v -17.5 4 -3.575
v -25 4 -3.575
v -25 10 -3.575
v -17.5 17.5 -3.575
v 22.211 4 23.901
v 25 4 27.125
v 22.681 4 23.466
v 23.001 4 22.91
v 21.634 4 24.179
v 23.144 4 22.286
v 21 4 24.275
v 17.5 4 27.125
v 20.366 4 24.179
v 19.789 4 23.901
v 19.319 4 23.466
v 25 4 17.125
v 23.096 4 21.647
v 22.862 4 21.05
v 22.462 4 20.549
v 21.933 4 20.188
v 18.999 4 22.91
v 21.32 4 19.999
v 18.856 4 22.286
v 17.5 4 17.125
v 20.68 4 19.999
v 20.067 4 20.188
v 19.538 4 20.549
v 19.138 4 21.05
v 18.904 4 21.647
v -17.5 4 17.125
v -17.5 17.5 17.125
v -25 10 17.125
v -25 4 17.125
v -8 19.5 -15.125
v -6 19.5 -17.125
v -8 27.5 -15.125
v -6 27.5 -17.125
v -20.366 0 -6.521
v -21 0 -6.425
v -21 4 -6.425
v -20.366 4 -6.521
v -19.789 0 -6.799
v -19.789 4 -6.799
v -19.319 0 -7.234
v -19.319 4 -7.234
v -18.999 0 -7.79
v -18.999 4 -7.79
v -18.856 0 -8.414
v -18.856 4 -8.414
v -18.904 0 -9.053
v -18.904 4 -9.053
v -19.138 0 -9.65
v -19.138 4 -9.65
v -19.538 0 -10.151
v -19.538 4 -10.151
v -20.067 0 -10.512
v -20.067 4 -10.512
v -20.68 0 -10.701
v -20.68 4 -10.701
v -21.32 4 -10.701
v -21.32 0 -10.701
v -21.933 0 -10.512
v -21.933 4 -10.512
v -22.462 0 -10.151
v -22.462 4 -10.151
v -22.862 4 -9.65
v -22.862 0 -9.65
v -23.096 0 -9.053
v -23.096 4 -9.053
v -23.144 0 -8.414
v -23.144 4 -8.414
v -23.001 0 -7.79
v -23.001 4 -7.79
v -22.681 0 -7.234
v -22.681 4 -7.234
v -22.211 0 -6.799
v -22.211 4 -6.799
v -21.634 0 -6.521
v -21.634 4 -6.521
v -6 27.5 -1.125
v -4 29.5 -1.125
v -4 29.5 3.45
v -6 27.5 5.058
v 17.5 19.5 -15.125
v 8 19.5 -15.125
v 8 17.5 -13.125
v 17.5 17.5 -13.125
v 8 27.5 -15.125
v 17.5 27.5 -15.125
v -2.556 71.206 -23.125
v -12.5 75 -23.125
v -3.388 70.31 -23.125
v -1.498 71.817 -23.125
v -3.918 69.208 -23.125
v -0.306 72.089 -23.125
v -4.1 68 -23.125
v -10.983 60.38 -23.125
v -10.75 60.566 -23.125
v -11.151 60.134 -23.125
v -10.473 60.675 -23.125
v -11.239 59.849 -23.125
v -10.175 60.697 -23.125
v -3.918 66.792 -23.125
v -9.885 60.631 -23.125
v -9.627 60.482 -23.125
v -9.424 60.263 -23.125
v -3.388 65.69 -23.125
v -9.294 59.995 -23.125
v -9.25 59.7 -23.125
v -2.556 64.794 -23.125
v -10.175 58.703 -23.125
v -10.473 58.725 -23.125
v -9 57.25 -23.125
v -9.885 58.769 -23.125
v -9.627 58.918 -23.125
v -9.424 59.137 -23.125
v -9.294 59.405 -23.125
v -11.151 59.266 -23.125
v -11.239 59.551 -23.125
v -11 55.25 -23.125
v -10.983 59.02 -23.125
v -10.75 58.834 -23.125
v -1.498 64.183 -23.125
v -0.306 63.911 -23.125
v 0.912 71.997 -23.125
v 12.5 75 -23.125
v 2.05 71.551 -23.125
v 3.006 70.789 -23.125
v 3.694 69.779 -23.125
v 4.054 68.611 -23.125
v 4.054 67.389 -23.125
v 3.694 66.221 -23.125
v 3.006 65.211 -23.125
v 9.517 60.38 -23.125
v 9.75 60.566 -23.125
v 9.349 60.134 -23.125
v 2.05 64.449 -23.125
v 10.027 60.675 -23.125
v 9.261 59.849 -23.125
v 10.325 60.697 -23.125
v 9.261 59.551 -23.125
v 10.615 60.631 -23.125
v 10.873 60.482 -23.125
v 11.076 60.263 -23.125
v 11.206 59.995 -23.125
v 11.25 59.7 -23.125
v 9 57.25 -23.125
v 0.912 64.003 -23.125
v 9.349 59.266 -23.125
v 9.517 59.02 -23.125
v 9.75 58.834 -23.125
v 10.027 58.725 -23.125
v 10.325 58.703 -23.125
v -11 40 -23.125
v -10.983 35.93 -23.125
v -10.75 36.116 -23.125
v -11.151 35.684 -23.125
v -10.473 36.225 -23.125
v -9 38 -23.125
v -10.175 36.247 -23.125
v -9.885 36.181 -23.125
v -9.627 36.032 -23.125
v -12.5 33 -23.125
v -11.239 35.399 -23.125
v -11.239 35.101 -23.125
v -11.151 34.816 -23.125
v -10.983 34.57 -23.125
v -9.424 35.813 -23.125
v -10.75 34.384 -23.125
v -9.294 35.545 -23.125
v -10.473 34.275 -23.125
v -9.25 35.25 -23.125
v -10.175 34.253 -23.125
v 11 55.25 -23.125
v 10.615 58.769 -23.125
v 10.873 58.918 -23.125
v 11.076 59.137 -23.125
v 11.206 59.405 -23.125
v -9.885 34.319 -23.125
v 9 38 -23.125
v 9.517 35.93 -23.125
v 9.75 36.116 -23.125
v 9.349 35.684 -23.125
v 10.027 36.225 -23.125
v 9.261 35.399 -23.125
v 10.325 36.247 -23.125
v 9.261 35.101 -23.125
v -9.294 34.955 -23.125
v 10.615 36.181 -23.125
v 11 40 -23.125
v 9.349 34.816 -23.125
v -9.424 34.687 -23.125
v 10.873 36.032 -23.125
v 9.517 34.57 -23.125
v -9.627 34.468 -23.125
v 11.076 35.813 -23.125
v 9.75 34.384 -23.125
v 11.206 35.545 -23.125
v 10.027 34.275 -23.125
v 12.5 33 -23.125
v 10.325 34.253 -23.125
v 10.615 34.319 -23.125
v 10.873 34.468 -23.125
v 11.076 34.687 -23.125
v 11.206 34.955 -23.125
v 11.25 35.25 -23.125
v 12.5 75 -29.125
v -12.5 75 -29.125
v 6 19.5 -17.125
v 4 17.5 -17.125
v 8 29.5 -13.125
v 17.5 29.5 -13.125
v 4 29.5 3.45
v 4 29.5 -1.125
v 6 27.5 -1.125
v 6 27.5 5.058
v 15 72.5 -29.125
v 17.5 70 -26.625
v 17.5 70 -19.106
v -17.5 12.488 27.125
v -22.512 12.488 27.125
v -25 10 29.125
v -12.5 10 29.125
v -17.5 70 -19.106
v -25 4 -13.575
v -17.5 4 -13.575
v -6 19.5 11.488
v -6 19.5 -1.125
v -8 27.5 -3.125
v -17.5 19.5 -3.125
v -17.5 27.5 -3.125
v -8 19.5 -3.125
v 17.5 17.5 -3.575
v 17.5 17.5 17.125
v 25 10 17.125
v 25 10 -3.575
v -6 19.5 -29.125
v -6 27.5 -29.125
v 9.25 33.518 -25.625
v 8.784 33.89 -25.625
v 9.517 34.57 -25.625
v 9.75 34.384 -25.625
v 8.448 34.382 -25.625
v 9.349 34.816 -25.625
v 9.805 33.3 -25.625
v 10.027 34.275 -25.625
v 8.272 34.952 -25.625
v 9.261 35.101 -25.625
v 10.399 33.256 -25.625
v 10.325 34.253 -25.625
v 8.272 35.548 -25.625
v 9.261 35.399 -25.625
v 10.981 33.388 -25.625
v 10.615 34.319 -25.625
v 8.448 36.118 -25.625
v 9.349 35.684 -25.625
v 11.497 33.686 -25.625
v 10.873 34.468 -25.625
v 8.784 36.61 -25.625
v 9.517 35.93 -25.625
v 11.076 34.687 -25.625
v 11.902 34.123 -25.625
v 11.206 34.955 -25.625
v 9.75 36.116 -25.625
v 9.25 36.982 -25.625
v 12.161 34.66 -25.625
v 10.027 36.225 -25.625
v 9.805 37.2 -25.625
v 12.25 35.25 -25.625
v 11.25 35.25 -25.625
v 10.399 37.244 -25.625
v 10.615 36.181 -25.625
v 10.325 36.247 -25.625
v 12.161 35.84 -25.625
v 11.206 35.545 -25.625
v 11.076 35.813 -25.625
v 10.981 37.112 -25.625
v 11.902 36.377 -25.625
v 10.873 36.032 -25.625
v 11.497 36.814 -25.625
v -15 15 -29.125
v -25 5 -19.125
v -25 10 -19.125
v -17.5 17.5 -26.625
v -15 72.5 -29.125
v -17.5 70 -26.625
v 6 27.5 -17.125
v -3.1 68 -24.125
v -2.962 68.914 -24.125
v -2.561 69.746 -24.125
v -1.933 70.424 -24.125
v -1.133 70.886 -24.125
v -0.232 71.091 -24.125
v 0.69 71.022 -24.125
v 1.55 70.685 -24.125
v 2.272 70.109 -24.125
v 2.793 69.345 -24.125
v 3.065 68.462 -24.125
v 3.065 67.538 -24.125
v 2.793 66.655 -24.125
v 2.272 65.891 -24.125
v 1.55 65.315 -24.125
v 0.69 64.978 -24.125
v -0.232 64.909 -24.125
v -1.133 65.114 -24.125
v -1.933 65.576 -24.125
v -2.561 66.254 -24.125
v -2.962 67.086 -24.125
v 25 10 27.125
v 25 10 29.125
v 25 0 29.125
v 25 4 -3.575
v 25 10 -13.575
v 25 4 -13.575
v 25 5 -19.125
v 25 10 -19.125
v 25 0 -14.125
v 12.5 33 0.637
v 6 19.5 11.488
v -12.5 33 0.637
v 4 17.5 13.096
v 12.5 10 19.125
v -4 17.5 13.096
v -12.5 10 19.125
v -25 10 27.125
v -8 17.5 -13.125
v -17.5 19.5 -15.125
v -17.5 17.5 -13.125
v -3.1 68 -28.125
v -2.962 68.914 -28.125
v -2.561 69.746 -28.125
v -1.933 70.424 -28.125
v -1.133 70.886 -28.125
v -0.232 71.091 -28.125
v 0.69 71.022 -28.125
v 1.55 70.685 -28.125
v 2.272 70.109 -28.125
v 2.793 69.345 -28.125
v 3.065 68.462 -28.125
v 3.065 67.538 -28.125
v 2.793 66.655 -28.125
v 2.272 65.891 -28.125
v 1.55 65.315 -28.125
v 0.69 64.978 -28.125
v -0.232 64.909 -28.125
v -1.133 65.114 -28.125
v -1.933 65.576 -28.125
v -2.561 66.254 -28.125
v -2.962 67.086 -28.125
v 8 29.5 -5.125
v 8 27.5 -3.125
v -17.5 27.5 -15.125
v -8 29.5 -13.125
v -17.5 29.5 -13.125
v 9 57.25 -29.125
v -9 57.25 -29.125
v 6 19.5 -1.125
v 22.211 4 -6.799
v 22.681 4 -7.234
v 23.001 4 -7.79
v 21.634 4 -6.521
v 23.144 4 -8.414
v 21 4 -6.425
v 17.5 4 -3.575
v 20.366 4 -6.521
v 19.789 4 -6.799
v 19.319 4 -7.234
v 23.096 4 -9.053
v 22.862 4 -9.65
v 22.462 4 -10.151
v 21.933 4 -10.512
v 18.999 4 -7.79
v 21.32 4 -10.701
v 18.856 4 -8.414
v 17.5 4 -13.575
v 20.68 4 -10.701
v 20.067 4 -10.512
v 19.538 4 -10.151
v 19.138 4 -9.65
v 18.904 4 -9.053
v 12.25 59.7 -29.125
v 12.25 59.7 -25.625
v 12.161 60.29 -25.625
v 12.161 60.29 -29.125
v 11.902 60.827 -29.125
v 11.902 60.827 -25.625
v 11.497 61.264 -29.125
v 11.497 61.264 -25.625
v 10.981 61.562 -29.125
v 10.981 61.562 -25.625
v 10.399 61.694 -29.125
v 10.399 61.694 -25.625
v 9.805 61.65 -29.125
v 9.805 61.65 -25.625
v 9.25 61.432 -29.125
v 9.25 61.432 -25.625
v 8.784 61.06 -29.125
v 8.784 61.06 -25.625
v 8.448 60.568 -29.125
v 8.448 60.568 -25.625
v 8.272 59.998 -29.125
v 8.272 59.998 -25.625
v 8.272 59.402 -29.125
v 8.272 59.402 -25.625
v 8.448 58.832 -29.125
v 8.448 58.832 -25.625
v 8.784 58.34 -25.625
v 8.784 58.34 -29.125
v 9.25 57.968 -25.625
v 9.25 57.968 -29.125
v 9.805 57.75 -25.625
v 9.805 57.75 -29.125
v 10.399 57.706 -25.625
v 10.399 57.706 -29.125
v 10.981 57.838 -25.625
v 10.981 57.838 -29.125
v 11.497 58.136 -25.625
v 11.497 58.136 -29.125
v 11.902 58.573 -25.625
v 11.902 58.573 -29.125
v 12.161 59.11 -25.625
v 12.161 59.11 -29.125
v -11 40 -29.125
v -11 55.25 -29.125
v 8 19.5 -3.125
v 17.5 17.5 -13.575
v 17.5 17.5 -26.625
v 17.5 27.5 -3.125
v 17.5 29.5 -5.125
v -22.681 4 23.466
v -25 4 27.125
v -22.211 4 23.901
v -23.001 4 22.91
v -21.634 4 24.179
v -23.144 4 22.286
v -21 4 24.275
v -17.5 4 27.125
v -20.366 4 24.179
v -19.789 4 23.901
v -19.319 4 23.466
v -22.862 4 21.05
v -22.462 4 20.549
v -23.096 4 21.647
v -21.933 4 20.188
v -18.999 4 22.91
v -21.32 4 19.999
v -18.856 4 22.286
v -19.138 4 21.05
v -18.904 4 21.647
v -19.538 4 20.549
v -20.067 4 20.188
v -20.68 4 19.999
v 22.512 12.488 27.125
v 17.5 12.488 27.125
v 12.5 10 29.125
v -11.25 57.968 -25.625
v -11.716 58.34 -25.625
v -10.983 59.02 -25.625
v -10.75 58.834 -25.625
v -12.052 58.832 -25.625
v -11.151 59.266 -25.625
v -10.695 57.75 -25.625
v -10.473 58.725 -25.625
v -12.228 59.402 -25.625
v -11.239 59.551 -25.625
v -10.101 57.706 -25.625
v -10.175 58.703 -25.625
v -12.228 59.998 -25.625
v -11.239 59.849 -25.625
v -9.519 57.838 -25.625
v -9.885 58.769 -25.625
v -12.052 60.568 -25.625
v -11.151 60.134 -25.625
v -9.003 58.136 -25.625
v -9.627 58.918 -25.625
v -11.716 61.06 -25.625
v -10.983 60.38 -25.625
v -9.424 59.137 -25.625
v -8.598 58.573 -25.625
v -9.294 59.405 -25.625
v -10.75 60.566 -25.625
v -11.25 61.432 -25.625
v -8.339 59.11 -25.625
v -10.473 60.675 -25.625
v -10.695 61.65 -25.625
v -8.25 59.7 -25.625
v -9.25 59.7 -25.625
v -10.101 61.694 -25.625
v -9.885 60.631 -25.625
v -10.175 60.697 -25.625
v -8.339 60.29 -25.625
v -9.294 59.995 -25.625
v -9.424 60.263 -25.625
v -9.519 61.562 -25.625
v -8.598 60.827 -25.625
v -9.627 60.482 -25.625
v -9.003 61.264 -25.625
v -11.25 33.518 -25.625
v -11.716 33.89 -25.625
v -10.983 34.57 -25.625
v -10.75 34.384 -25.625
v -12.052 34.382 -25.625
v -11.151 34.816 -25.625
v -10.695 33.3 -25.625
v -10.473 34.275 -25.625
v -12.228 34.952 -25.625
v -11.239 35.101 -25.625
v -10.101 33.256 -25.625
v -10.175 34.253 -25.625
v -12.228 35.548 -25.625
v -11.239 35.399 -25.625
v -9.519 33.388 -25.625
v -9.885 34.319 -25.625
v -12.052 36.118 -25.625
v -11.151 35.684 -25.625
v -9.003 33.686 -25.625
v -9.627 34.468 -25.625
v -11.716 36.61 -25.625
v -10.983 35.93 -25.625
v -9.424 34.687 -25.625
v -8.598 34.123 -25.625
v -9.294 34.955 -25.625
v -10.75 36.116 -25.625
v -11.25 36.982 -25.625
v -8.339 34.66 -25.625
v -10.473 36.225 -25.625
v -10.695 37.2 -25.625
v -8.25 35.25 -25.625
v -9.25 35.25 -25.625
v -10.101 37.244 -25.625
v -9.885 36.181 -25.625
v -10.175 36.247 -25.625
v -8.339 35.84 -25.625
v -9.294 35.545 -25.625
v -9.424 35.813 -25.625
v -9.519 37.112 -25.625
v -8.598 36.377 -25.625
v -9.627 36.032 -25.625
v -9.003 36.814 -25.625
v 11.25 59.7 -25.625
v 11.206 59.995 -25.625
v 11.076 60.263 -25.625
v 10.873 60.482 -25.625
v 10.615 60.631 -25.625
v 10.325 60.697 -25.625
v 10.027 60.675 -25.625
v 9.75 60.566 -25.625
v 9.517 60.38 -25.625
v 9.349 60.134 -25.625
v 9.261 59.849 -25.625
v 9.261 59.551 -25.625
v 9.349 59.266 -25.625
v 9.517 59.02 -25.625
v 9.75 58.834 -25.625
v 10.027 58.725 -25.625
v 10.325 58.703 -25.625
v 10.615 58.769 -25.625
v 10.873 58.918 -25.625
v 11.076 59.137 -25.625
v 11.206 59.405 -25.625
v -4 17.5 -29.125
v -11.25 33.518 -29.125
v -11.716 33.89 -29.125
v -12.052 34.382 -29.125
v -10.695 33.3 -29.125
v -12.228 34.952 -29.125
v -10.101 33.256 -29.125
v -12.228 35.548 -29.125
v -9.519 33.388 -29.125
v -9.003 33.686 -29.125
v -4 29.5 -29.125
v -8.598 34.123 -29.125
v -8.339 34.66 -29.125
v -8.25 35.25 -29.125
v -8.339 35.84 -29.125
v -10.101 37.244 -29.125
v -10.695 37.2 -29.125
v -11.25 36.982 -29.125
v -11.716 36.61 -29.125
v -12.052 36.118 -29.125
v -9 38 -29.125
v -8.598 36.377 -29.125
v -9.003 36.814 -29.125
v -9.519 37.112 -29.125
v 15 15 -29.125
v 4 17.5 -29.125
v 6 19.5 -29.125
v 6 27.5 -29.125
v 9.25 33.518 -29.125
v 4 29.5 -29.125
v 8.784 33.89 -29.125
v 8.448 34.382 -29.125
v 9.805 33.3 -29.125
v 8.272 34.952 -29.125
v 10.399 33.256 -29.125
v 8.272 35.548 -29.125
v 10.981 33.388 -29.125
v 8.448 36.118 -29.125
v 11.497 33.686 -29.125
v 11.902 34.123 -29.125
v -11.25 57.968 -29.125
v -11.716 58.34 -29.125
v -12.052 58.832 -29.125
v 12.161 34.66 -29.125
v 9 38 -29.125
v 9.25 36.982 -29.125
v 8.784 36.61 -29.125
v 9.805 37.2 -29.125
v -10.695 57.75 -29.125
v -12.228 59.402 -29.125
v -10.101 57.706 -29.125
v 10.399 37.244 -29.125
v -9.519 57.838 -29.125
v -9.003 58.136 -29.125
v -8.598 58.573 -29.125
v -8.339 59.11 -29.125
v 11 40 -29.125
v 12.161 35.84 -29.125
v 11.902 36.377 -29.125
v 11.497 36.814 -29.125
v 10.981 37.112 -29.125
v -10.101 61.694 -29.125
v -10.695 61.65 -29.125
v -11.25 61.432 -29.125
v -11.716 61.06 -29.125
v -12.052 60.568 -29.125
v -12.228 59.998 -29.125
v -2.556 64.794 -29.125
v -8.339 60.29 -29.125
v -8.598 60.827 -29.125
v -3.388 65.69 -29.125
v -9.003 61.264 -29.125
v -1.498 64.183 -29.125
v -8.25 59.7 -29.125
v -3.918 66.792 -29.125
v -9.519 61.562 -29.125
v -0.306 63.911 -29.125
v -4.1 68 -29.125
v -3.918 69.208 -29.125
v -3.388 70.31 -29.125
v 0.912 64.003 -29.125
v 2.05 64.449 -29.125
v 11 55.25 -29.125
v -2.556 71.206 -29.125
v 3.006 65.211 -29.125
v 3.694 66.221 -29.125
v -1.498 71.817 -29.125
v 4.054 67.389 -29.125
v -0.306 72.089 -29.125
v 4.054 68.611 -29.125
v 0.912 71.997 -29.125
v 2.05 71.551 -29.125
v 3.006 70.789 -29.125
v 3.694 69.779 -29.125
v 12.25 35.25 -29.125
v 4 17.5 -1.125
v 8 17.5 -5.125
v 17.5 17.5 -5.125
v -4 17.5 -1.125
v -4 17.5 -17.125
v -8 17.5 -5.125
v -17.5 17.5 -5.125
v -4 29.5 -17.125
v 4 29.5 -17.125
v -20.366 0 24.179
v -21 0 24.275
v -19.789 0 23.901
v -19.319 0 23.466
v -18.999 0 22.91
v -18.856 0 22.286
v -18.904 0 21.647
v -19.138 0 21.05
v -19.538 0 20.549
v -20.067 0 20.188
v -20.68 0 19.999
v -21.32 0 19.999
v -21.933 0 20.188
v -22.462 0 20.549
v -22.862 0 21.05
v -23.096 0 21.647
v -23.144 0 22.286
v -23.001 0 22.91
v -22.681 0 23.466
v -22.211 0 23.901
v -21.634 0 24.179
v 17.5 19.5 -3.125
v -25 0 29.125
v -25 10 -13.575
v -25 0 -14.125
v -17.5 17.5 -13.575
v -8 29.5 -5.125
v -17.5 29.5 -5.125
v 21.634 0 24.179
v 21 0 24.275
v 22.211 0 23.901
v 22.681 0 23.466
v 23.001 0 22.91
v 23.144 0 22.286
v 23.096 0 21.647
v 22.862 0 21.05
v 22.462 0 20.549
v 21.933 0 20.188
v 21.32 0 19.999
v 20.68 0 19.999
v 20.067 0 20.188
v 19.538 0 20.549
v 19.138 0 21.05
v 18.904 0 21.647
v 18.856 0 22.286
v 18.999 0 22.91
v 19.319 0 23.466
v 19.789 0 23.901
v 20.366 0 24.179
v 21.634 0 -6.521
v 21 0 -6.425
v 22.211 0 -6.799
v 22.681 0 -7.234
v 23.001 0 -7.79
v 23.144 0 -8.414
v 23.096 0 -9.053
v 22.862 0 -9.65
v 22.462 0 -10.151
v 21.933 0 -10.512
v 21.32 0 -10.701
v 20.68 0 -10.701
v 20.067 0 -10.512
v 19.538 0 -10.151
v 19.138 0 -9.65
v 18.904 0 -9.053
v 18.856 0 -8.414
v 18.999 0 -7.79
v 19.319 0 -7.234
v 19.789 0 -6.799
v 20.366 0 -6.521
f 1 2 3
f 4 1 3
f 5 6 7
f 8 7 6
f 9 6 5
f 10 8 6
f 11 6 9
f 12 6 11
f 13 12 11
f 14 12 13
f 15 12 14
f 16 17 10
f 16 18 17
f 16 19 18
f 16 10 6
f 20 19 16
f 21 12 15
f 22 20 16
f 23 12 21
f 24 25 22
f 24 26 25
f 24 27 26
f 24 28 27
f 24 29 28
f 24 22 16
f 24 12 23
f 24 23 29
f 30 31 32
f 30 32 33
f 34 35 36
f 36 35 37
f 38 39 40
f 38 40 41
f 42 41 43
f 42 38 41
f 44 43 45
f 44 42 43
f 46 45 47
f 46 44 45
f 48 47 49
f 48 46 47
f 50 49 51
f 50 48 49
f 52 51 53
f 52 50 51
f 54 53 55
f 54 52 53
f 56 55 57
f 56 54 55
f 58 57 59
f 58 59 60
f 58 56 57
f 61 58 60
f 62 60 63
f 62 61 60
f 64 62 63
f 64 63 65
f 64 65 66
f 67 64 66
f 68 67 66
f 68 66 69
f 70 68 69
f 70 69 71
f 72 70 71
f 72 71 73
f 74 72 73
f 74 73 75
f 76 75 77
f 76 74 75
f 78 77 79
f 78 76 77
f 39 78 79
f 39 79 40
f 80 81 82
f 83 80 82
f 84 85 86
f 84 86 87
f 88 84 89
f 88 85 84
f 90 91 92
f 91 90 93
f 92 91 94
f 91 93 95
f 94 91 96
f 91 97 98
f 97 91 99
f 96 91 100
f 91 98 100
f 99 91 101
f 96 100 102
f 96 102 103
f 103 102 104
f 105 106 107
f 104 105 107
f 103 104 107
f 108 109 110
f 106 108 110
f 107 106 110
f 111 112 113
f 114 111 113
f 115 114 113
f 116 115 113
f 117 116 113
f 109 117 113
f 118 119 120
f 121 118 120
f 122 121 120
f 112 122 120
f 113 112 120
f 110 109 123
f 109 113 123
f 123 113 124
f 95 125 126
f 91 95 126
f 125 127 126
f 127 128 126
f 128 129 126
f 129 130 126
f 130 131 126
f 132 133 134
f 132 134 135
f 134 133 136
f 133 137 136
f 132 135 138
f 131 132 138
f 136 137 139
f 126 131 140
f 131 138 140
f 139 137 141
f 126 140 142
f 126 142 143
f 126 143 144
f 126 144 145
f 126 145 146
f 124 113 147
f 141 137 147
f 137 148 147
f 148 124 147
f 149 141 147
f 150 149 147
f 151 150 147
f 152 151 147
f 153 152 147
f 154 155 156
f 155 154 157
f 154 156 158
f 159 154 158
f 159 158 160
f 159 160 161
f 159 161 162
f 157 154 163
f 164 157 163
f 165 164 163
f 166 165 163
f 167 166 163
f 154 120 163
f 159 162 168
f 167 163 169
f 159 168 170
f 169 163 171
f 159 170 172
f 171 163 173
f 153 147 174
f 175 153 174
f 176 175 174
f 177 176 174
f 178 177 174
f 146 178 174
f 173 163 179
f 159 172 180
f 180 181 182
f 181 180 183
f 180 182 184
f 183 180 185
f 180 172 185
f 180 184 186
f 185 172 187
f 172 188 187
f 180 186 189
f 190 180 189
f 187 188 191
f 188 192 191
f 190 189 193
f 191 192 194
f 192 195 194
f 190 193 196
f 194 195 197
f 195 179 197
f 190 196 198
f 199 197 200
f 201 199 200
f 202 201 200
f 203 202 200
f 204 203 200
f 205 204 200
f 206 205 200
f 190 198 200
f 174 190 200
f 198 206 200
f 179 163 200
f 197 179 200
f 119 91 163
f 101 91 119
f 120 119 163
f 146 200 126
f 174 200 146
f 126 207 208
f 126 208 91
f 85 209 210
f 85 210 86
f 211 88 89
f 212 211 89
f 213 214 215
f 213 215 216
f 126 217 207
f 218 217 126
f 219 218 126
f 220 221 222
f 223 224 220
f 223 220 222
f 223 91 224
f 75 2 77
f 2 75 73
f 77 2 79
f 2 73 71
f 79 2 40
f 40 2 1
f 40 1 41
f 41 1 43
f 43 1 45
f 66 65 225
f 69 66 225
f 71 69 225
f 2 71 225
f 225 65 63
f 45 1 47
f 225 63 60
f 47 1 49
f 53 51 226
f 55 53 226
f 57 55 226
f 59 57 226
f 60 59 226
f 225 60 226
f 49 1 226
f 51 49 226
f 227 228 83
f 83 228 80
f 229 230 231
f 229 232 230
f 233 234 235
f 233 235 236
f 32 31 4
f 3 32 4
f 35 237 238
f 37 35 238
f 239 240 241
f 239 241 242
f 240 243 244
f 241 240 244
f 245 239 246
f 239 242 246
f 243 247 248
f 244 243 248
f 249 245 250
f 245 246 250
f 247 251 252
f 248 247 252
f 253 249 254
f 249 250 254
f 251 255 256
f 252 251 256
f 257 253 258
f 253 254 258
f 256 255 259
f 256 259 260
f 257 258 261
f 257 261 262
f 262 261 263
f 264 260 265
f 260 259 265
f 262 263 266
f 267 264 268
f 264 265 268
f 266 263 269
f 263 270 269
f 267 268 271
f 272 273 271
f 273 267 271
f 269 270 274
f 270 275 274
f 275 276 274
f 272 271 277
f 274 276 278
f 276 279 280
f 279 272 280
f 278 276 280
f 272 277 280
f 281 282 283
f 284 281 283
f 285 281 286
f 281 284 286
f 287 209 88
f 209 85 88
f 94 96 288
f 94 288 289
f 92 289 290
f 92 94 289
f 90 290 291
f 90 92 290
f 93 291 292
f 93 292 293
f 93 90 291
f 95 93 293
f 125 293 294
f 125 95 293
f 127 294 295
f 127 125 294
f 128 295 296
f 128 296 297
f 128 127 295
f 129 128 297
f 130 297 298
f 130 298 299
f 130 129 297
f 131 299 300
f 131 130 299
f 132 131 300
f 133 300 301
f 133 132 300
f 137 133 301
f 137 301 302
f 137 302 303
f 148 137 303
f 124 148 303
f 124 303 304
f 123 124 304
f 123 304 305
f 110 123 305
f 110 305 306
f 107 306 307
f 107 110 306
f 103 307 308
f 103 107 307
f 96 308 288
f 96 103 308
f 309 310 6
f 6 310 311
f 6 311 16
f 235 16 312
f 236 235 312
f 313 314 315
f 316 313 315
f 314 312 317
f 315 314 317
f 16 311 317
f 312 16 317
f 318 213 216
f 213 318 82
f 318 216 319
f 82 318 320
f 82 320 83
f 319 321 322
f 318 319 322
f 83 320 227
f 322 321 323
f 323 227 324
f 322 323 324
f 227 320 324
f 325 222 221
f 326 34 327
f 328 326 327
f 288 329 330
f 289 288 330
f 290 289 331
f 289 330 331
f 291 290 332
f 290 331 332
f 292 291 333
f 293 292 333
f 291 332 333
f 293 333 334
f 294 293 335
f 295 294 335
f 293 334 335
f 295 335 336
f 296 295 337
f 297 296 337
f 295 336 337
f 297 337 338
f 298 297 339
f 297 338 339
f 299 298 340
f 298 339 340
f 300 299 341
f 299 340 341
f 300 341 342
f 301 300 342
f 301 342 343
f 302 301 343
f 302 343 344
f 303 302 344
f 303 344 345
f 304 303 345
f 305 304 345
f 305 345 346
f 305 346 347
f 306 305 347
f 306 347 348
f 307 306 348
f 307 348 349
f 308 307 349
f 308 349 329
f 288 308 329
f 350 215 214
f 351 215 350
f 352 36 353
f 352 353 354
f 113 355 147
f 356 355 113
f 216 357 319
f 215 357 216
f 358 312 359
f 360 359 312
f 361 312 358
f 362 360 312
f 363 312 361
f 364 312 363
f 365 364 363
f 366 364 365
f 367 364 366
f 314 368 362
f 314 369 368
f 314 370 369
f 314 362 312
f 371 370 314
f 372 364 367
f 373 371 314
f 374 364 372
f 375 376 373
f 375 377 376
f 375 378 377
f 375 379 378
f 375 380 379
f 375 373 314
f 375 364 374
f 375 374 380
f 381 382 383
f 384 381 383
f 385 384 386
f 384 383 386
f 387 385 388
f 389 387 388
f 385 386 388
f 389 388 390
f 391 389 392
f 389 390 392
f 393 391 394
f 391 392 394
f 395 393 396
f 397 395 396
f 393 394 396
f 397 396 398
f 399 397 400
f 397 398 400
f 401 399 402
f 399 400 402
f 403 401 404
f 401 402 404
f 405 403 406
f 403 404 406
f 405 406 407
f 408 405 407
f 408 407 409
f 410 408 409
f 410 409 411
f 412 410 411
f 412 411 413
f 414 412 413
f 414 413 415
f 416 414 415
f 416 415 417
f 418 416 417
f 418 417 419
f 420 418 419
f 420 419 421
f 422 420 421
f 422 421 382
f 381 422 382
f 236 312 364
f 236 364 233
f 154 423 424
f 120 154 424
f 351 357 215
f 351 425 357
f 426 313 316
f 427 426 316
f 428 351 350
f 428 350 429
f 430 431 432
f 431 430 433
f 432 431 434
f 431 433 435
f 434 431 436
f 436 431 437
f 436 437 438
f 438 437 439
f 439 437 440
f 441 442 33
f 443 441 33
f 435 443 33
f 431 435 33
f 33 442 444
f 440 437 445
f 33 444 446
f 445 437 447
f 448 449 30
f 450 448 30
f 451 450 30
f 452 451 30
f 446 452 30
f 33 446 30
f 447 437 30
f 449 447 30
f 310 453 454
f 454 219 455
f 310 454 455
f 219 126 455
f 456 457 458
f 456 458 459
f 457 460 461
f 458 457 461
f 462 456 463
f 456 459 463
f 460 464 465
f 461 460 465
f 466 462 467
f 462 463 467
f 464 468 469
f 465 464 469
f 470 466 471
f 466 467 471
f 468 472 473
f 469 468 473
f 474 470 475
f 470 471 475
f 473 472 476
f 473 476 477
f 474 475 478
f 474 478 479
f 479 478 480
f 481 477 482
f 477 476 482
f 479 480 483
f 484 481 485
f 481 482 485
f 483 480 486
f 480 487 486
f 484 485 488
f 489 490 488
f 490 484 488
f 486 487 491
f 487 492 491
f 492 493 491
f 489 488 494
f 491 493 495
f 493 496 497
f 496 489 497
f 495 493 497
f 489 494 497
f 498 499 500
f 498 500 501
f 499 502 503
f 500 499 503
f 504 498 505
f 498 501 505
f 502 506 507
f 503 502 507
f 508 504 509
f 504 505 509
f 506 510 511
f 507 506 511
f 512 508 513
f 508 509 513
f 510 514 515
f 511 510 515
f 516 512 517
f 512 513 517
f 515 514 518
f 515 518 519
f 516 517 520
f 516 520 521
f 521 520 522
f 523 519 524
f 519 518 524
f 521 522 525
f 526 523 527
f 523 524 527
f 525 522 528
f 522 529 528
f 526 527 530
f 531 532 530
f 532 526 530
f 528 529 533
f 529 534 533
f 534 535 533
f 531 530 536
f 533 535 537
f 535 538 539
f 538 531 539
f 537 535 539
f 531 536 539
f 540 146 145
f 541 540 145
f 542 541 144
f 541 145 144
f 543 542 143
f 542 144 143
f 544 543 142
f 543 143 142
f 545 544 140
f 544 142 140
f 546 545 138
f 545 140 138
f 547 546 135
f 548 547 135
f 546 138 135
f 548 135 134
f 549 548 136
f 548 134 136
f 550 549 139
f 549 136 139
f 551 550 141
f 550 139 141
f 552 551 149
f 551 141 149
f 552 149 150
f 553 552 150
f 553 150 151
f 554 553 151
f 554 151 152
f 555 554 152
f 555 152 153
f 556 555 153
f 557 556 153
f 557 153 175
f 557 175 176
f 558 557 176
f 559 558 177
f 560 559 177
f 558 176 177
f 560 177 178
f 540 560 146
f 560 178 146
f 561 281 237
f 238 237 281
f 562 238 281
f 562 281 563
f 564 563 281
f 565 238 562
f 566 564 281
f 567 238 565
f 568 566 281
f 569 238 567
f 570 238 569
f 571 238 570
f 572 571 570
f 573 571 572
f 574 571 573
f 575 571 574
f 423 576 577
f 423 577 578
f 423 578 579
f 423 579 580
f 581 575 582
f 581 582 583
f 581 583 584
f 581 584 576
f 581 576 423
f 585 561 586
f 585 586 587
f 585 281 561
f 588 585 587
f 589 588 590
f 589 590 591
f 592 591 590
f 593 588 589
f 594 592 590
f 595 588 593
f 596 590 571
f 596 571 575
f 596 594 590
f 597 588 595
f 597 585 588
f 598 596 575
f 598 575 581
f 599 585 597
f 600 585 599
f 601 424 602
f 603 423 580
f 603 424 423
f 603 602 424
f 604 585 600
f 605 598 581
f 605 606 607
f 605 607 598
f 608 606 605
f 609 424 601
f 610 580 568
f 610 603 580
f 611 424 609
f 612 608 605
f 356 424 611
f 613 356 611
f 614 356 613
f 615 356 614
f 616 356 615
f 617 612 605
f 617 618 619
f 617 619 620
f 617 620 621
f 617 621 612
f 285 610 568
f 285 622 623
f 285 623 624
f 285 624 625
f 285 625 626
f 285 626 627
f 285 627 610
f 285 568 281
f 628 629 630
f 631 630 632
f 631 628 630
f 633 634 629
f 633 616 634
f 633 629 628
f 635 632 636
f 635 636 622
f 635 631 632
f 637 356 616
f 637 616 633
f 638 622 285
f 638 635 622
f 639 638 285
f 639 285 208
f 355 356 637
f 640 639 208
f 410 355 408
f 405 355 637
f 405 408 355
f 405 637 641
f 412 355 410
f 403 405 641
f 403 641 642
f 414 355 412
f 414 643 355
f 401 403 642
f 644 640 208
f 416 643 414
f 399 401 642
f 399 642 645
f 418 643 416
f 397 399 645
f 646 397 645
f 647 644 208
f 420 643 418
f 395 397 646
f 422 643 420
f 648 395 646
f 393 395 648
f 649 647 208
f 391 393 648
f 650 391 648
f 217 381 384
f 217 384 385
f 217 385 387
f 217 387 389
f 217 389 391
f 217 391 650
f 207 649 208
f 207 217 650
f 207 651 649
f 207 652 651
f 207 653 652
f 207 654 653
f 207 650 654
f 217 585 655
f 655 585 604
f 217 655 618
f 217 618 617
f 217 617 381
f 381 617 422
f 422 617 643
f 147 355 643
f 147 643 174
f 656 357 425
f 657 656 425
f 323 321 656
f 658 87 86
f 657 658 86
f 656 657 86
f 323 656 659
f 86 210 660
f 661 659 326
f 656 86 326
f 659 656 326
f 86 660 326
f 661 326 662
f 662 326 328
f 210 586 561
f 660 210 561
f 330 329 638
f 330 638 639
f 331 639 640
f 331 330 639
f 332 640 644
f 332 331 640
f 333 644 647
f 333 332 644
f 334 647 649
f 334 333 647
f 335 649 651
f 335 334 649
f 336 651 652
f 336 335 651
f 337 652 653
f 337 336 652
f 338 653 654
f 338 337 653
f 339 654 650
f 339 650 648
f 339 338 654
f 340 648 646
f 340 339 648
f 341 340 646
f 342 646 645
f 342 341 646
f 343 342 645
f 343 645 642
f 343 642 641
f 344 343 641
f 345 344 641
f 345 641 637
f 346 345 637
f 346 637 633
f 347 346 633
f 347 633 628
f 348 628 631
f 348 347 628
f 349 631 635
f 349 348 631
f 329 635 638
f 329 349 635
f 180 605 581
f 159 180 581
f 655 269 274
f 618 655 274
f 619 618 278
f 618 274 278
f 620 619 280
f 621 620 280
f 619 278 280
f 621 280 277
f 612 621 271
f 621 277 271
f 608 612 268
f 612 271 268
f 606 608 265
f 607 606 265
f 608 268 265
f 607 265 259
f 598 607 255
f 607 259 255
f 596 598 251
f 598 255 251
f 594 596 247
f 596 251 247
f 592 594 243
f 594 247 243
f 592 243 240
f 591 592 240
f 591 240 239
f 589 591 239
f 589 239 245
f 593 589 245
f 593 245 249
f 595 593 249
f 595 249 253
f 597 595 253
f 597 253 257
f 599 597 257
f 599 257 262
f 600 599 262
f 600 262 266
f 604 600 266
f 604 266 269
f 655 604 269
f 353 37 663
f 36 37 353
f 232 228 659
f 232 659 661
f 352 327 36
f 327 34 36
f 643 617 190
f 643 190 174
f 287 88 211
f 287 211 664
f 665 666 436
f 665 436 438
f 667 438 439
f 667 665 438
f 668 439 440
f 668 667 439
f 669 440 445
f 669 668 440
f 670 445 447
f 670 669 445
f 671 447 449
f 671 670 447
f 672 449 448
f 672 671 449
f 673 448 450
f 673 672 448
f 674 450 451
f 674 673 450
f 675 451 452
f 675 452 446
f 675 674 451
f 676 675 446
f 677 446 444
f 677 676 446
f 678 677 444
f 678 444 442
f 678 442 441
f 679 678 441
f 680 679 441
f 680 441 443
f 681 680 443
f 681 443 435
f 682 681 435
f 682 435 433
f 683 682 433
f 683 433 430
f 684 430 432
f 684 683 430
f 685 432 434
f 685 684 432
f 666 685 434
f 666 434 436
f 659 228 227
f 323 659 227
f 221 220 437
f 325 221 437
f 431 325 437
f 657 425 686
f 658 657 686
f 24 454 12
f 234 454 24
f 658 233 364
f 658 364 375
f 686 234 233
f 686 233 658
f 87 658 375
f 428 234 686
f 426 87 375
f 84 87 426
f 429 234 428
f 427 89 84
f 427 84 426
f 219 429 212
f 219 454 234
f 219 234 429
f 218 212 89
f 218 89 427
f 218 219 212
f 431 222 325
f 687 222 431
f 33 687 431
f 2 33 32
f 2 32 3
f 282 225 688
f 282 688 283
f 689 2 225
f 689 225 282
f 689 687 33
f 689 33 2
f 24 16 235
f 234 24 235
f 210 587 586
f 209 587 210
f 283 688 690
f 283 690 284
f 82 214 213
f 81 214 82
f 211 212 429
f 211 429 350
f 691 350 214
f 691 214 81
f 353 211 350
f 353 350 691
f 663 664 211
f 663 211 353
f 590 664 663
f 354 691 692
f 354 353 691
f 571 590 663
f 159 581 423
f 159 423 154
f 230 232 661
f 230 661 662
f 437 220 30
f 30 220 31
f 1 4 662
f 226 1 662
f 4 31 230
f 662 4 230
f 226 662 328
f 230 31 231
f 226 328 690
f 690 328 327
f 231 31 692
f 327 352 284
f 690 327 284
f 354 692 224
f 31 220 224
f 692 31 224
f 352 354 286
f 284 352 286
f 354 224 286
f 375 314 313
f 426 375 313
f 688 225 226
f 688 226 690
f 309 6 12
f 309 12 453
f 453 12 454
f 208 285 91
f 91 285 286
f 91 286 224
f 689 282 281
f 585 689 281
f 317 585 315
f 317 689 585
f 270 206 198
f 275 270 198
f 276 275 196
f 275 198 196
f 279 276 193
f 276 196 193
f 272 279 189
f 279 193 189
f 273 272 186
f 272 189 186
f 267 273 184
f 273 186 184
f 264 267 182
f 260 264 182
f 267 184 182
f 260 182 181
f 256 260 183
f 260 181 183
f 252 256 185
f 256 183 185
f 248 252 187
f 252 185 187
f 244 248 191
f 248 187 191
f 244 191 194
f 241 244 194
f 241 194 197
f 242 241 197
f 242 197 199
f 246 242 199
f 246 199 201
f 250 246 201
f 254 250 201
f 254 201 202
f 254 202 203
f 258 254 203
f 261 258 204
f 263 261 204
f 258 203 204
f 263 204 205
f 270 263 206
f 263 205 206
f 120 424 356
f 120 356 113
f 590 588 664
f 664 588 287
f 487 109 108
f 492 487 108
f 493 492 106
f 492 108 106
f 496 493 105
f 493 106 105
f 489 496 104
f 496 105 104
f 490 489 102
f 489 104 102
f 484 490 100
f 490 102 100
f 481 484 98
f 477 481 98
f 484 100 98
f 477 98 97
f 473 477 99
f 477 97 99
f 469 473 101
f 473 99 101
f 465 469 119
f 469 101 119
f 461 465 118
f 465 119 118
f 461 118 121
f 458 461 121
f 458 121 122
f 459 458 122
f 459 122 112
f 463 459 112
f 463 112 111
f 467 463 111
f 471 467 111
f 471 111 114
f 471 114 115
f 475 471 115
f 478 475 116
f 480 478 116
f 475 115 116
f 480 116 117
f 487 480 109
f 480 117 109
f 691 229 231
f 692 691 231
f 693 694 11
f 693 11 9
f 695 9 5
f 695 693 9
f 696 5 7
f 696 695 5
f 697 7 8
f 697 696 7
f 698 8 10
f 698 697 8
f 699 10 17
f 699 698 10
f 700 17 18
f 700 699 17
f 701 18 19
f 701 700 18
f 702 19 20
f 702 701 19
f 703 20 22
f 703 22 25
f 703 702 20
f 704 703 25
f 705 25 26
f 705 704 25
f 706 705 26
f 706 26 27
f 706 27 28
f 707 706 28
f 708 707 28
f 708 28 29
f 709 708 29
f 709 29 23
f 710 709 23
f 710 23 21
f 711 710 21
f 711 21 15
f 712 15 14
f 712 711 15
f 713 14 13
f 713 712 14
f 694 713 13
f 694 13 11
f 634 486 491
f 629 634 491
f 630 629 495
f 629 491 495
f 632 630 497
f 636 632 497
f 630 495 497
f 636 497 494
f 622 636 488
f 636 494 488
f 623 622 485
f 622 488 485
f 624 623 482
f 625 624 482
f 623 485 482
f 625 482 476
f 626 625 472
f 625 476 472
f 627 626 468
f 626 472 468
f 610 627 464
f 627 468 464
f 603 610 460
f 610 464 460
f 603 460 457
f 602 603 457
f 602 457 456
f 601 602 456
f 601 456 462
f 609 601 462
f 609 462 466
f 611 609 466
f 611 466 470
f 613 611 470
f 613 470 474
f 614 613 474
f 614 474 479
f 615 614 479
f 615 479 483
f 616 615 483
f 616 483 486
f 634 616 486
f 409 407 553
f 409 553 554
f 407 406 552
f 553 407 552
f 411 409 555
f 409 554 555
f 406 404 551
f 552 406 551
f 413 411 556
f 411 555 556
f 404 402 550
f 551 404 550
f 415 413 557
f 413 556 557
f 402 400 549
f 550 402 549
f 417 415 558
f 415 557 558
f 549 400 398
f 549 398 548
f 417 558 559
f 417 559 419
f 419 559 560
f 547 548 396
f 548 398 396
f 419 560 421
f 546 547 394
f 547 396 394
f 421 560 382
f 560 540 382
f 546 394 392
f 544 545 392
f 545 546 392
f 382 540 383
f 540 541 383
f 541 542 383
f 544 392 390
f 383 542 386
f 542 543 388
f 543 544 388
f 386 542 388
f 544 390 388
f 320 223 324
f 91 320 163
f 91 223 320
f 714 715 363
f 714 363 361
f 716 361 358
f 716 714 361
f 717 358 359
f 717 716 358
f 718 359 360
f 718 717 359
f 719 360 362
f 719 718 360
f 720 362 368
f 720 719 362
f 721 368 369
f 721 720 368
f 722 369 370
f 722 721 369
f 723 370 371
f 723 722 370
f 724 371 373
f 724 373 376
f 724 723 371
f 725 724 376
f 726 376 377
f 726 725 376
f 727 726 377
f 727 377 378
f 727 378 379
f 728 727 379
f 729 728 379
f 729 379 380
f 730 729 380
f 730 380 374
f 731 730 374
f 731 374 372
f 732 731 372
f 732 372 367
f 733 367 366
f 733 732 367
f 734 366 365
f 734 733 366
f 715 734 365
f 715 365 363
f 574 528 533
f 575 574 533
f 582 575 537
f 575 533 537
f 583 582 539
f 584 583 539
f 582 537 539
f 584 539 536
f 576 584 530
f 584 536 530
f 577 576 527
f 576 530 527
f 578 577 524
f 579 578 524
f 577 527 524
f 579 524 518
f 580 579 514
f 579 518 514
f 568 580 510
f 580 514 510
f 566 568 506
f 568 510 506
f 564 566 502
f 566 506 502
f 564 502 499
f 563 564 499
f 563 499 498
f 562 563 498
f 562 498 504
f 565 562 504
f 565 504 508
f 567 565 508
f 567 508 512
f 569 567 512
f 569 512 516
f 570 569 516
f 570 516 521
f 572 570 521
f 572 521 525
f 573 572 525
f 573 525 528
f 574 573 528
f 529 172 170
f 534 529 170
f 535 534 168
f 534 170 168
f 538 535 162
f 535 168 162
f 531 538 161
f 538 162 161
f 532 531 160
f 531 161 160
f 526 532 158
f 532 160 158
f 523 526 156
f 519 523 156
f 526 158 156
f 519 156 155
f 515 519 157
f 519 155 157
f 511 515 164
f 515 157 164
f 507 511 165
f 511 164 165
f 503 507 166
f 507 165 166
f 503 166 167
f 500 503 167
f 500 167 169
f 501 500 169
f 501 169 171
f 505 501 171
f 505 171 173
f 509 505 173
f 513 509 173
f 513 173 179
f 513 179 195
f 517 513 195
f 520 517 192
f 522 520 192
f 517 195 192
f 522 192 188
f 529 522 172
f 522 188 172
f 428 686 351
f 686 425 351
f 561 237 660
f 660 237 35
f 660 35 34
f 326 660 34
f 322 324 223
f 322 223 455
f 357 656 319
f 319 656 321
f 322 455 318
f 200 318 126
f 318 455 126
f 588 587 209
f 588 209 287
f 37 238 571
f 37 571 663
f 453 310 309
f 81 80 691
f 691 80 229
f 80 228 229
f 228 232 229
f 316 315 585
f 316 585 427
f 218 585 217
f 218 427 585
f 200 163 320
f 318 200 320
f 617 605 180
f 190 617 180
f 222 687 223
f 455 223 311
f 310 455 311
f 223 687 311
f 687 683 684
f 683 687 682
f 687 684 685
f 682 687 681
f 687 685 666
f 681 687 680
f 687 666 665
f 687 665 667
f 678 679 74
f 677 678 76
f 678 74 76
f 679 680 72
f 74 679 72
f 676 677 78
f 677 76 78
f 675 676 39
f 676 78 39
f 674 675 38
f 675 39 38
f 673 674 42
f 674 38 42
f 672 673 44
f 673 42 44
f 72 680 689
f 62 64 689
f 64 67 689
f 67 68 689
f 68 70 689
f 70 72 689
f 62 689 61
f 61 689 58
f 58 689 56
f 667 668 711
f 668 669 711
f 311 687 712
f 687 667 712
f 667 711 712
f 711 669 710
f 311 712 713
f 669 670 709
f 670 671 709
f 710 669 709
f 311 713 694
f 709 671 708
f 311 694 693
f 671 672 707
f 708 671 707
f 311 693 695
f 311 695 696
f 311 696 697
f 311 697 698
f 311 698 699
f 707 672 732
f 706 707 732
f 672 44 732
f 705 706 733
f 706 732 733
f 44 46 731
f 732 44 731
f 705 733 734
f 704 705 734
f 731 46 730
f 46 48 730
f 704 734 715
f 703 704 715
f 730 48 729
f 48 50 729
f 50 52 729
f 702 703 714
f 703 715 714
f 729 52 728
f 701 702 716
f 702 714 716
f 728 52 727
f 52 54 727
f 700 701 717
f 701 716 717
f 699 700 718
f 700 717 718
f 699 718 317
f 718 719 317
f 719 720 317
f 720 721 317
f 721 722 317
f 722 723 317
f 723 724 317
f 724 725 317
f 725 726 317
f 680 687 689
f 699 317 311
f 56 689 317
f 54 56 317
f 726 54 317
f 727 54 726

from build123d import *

# Parameters (mm, degrees)
SKETCH1_W               = 50
SKETCH1_H               = 58.25
BOSS_EXTRUDE1_DEPTH     = 10
SKETCH2_R               = 2.15
CUT_EXTRUDE1_DEPTH      = 4
SKETCH5_W               = 25
SKETCH5_H               = 6
BOSS_EXTRUDE3_DEPTH     = 65
CUT_EXTRUDE3_REACH      = 100.199
SKETCH6_W               = 22
SKETCH6_H               = 19.25
SKETCH7_R               = 1
CUT_EXTRUDE4_DEPTH      = 2.5
CUT_EXTRUDE5_REACH      = 98.164
SKETCH8_R               = 2
BOSS_EXTRUDE4_DEPTH     = 5
CHAMFER1_SIZE           = 7.5
CHAMFER2_SIZE           = 10
CHAMFER4_SIZE           = 15
CHAMFER5_SIZE           = 5
CHAMFER7_SIZE           = 2
CUT_EXTRUDE6_REACH      = 100.199
SKETCH10_R              = 3.1
CHAMFER8_SIZE           = 1
BOSS_EXTRUDE5_REACH     = 90.767
CUT_EXTRUDE7_REACH      = 100.199
SKETCH12_W              = 12
SKETCH12_H              = 12
CUT_EXTRUDE9_REACH      = 88.222
SKETCH14_W              = 12
SKETCH14_H              = 12
CHAMFER11_SIZE          = 2
CUT_EXTRUDE12_OUTLINE_W = 10
CUT_EXTRUDE12_OUTLINE_H = 13.5
CUT_EXTRUDE12_DEPTH     = 7.5
LPATTERN1_COUNT         = 2
LPATTERN1_PITCH         = 30.7
MIRROR3_COPY_1_SKETCH_W = 10
MIRROR3_COPY_1_SKETCH_H = 13.5
MIRROR3_COPY_1_DEPTH    = 7.5


# Read off the part's stored shape, not the designer's step: Cut-Extrude12
with BuildPart() as part:
    # Sketch1 → Boss-Extrude1 (new body)
    with BuildSketch(Plane(origin=(0, 0, 0), x_dir=(1, 0, 0), z_dir=(0, 1, 0))):
        Rectangle(SKETCH1_W, SKETCH1_H)
    extrude(amount=BOSS_EXTRUDE1_DEPTH)

    # Sketch2 → Cut-Extrude1 (cut)
    with BuildSketch(Plane(origin=(0, 0, 0), x_dir=(1, 0, 0), z_dir=(0, 1, 0))):
        with Locations(Location((-21, 8.575, 0), (0, 0, 270))):
            Circle(SKETCH2_R)
        with Locations(Location((-21, -22.125, 0), (0, 0, 270))):
            Circle(SKETCH2_R)
        with Locations(Location((21, 8.575, 0), (0, 0, 270))):
            Circle(SKETCH2_R)
        with Locations(Location((21, -22.125, 0), (0, 0, 270))):
            Circle(SKETCH2_R)
    extrude(amount=CUT_EXTRUDE1_DEPTH, mode=Mode.SUBTRACT)

    # Sketch5 → Boss-Extrude3 (add)
    with BuildSketch(Plane(origin=(0, 10, 0), x_dir=(1, 0, 0), z_dir=(0, 1, 0))):
        with Locations((0, 26.125)):
            Rectangle(SKETCH5_W, SKETCH5_H)
    extrude(amount=BOSS_EXTRUDE3_DEPTH)

    # Sketch6 → Cut-Extrude3 (cut, up to next)
    with BuildSketch(Plane(origin=(0, 0, -29.125), x_dir=(-1, 0, 0), z_dir=(0, 0, -1)), mode=Mode.PRIVATE) as cut_extrude3_sk1:
        with Locations((0, 47.625)):
            Rectangle(SKETCH6_W, SKETCH6_H)
    cut_extrude3_tool1 = extrude(cut_extrude3_sk1.sketch, amount=-CUT_EXTRUDE3_REACH, mode=Mode.PRIVATE) & part.part
    add(cut_extrude3_tool1.solids().sort_by_distance((0, 47.625, -29.125))[0], mode=Mode.SUBTRACT)

    # Sketch7 → Cut-Extrude4 (cut)
    with BuildSketch(Plane.XY.offset(-23.125)):
        with Locations((10.25, 35.25)):
            Circle(SKETCH7_R)
        with Locations((-10.25, 35.25)):
            Circle(SKETCH7_R)
        with Locations((-10.25, 59.7)):
            Circle(SKETCH7_R)
        with Locations((10.25, 59.7)):
            Circle(SKETCH7_R)
    extrude(amount=-CUT_EXTRUDE4_DEPTH, mode=Mode.SUBTRACT)

    # Sketch8 → Cut-Extrude5 (cut, up to next)
    with BuildSketch(Plane.XY.offset(-25.625), mode=Mode.PRIVATE) as cut_extrude5_sk1:
        with Locations((-10.25, 59.7)):
            Circle(SKETCH8_R)
    cut_extrude5_tool1 = extrude(cut_extrude5_sk1.sketch, amount=-CUT_EXTRUDE5_REACH, mode=Mode.PRIVATE) & part.part
    # Sketch8 → Cut-Extrude5 (cut, up to next)
    with BuildSketch(Plane.XY.offset(-25.625), mode=Mode.PRIVATE) as cut_extrude5_sk2:
        with Locations((10.25, 59.7)):
            Circle(SKETCH8_R)
    cut_extrude5_tool2 = extrude(cut_extrude5_sk2.sketch, amount=-CUT_EXTRUDE5_REACH, mode=Mode.PRIVATE) & part.part
    # Sketch8 → Cut-Extrude5 (cut, up to next)
    with BuildSketch(Plane.XY.offset(-25.625), mode=Mode.PRIVATE) as cut_extrude5_sk3:
        with Locations((10.25, 35.25)):
            Circle(SKETCH8_R)
    cut_extrude5_tool3 = extrude(cut_extrude5_sk3.sketch, amount=-CUT_EXTRUDE5_REACH, mode=Mode.PRIVATE) & part.part
    # Sketch8 → Cut-Extrude5 (cut, up to next)
    with BuildSketch(Plane.XY.offset(-25.625), mode=Mode.PRIVATE) as cut_extrude5_sk4:
        with Locations((-10.25, 35.25)):
            Circle(SKETCH8_R)
    cut_extrude5_tool4 = extrude(cut_extrude5_sk4.sketch, amount=-CUT_EXTRUDE5_REACH, mode=Mode.PRIVATE) & part.part
    add(cut_extrude5_tool1.solids().sort_by_distance((-10.25, 59.7, -25.625))[0], mode=Mode.SUBTRACT)
    add(cut_extrude5_tool2.solids().sort_by_distance((10.25, 59.7, -25.625))[0], mode=Mode.SUBTRACT)
    add(cut_extrude5_tool3.solids().sort_by_distance((10.25, 35.25, -25.625))[0], mode=Mode.SUBTRACT)
    add(cut_extrude5_tool4.solids().sort_by_distance((-10.25, 35.25, -25.625))[0], mode=Mode.SUBTRACT)

    # Sketch9 → Boss-Extrude4 (add)
    with BuildSketch(Plane(origin=(12.5, 0, 0), x_dir=(0, 0, -1), z_dir=(1, 0, 0))):
        Polygon((29.125, 75), (23.125, 75), (-29.125, 10), (29.125, 10), align=None)
    boss_extrude4 = extrude(amount=BOSS_EXTRUDE4_DEPTH)

    # Mirror1: Boss-Extrude4 across plane
    add(boss_extrude4.mirror(Plane(origin=(0, 0, 0), x_dir=(0, 0, 1), z_dir=(1, 0, 0))))

    # Chamfer1
    chamfer1_edges = [part.edges().sort_by_distance(p)[0] for p in [
        (17.5, 10, 0),
        (-17.5, 10, 0),
    ]]
    chamfer(chamfer1_edges, length=CHAMFER1_SIZE - 0.0001)  # a hair under: the kernel refuses the full size

    # Chamfer2
    chamfer2_edges = [part.edges().sort_by_distance(p)[0] for p in [
        (-25, 5, -29.125),
        (25, 5, -29.125),
    ]]
    chamfer(chamfer2_edges, length=CHAMFER2_SIZE)

    # Chamfer4
    chamfer4_edges = [part.edges().sort_by_distance(p)[0] for p in [
        (0, 0, -29.125),
    ]]
    chamfer(chamfer4_edges, length=CHAMFER4_SIZE)

    # Chamfer5
    chamfer5_edges = [part.edges().sort_by_distance(p)[0] for p in [
        (17.5, 75, -24.875),
        (-17.5, 75, -24.875),
    ]]
    chamfer(chamfer5_edges, length=CHAMFER5_SIZE)

    # Chamfer7
    chamfer7_edges = [part.edges().sort_by_distance(p)[0] for p in [
        (-11, 57.25, -26.125),
        (-11, 38, -26.125),
        (11, 38, -26.125),
        (11, 57.25, -26.125),
    ]]
    chamfer(chamfer7_edges, length=CHAMFER7_SIZE)

    # Sketch10 → Cut-Extrude6 (cut, up to next)
    with BuildSketch(Plane(origin=(0, 0, -29.125), x_dir=(-1, 0, 0), z_dir=(0, 0, -1)), mode=Mode.PRIVATE) as cut_extrude6_sk1:
        with Locations((0, 68)):
            Circle(SKETCH10_R)
    cut_extrude6_tool1 = extrude(cut_extrude6_sk1.sketch, amount=-CUT_EXTRUDE6_REACH, mode=Mode.PRIVATE) & part.part
    add(cut_extrude6_tool1.solids().sort_by_distance((0, 68, -29.125))[0], mode=Mode.SUBTRACT)

    # Chamfer8
    chamfer8_edges = [part.edges().sort_by_distance(p)[0] for p in [
        (3.1, 68, -29.125),
        (3.1, 68, -23.125),
    ]]
    chamfer(chamfer8_edges, length=CHAMFER8_SIZE)

    # Sketch11 → Boss-Extrude5 (add, up to next)
    with BuildSketch(Plane(origin=(-12.5, 0, 0), x_dir=(0, 0, -1), z_dir=(1, 0, 0)), mode=Mode.PRIVATE) as boss_extrude5_sk1:
        Polygon((-19.125, 10), (23.125, 10), (23.125, 33), (-0.636538462, 33), align=None)
    boss_extrude5_tool1 = extrude(boss_extrude5_sk1.sketch, amount=BOSS_EXTRUDE5_REACH, mode=Mode.PRIVATE) - part.part
    add(boss_extrude5_tool1.solids().sort_by_distance((-12.5, 20.426363, -6.190596))[0])

    # Cut-Extrude7: up to this plane
    cut_extrude7_end = Plane(origin=(25.002, 33, 0.636538462), z_dir=(0, -0.6265212074854106, -0.7794043729483581))
    # Sketch12 → Cut-Extrude7 (cut, up to the surface)
    with BuildSketch(Plane(origin=(0, 0, -29.125), x_dir=(-1, 0, 0), z_dir=(0, 0, -1)), mode=Mode.PRIVATE) as cut_extrude7_sk1:
        with Locations((0, 23.5)):
            Rectangle(SKETCH12_W, SKETCH12_H)
    cut_extrude7_tool1 = split(extrude(cut_extrude7_sk1.sketch, amount=-CUT_EXTRUDE7_REACH, mode=Mode.PRIVATE), bisect_by=cut_extrude7_end, keep=Keep.BOTH, mode=Mode.PRIVATE)
    add(cut_extrude7_tool1.solids().sort_by_distance((0, 23.5, -29.125))[0], mode=Mode.SUBTRACT)

    # Sketch14 → Cut-Extrude9 (cut, up to next)
    with BuildSketch(Plane(origin=(-6, 0, 0), x_dir=(0, 0, -1), z_dir=(1, 0, 0)), mode=Mode.PRIVATE) as cut_extrude9_sk1:
        with Locations((9.125, 23.5)):
            Rectangle(SKETCH14_W, SKETCH14_H)
    cut_extrude9_tool1 = extrude(cut_extrude9_sk1.sketch, amount=-CUT_EXTRUDE9_REACH, mode=Mode.PRIVATE) & part.part
    cut_extrude9 = cut_extrude9_tool1.solids().sort_by_distance((-6, 23.5, -9.125))[0]
    add(cut_extrude9, mode=Mode.SUBTRACT)

    # Mirror2: Cut-Extrude9 across plane
    add(cut_extrude9.mirror(Plane(origin=(0, 0, 0), x_dir=(0, 0, 1), z_dir=(1, 0, 0))), mode=Mode.SUBTRACT)

    # Chamfer11
    chamfer11_edges = [part.edges().sort_by_distance(p)[0] for p in [
        (-6, 17.5, 4.985576923),
        (6, 17.5, 4.985576923),
        (6, 29.5, 0.1625),
        (-6, 29.5, 0.1625),
        (-6, 17.5, -22.125),
        (-6, 29.5, -22.125),
        (-11.75, 17.5, -15.125),
        (-11.75, 29.5, -15.125),
        (-11.75, 17.5, -3.125),
        (-11.75, 29.5, -3.125),
        (-6, 23.5, -15.125),
        (-6, 23.5, -3.125),
        (6, 29.5, -22.125),
        (6, 17.5, -22.125),
        (11.75, 17.5, -3.125),
        (11.75, 17.5, -15.125),
        (6, 23.5, -15.125),
        (11.75, 29.5, -15.125),
        (11.75, 29.5, -3.125),
        (6, 23.5, -3.125),
    ]]
    chamfer(chamfer11_edges, length=CHAMFER11_SIZE)

    # Cut-Extrude12 outline → Cut-Extrude12 (cut)
    with BuildSketch(Plane(origin=(17.5, 0, 0), x_dir=(0, 0, -1), z_dir=(1, 0, 0))):
        with Locations((8.575, 10.75)):
            Rectangle(CUT_EXTRUDE12_OUTLINE_W, CUT_EXTRUDE12_OUTLINE_H)
    cut_extrude12 = extrude(amount=CUT_EXTRUDE12_DEPTH, mode=Mode.SUBTRACT)

    # LPattern1: Cut-Extrude12 ×2
    with Locations(*[(0, 0, i * LPATTERN1_PITCH) for i in range(1, LPATTERN1_COUNT)]):
        add(cut_extrude12, mode=Mode.SUBTRACT)

    # Mirror3: Cut-Extrude12 across plane
    add(cut_extrude12.mirror(Plane(origin=(0, 0, 0), x_dir=(0, 0, 1), z_dir=(1, 0, 0))), mode=Mode.SUBTRACT)

    # Mirror3 copy 1 sketch → Mirror3 copy 1 (cut)
    with BuildSketch(Plane(origin=(-17.5, 0, 30.7), x_dir=(0, 0, -1), z_dir=(-1, 0, 0))):
        with Locations((8.575, -10.75)):
            Rectangle(MIRROR3_COPY_1_SKETCH_W, MIRROR3_COPY_1_SKETCH_H)
    extrude(amount=MIRROR3_COPY_1_DEPTH, mode=Mode.SUBTRACT)


solid = part.part
